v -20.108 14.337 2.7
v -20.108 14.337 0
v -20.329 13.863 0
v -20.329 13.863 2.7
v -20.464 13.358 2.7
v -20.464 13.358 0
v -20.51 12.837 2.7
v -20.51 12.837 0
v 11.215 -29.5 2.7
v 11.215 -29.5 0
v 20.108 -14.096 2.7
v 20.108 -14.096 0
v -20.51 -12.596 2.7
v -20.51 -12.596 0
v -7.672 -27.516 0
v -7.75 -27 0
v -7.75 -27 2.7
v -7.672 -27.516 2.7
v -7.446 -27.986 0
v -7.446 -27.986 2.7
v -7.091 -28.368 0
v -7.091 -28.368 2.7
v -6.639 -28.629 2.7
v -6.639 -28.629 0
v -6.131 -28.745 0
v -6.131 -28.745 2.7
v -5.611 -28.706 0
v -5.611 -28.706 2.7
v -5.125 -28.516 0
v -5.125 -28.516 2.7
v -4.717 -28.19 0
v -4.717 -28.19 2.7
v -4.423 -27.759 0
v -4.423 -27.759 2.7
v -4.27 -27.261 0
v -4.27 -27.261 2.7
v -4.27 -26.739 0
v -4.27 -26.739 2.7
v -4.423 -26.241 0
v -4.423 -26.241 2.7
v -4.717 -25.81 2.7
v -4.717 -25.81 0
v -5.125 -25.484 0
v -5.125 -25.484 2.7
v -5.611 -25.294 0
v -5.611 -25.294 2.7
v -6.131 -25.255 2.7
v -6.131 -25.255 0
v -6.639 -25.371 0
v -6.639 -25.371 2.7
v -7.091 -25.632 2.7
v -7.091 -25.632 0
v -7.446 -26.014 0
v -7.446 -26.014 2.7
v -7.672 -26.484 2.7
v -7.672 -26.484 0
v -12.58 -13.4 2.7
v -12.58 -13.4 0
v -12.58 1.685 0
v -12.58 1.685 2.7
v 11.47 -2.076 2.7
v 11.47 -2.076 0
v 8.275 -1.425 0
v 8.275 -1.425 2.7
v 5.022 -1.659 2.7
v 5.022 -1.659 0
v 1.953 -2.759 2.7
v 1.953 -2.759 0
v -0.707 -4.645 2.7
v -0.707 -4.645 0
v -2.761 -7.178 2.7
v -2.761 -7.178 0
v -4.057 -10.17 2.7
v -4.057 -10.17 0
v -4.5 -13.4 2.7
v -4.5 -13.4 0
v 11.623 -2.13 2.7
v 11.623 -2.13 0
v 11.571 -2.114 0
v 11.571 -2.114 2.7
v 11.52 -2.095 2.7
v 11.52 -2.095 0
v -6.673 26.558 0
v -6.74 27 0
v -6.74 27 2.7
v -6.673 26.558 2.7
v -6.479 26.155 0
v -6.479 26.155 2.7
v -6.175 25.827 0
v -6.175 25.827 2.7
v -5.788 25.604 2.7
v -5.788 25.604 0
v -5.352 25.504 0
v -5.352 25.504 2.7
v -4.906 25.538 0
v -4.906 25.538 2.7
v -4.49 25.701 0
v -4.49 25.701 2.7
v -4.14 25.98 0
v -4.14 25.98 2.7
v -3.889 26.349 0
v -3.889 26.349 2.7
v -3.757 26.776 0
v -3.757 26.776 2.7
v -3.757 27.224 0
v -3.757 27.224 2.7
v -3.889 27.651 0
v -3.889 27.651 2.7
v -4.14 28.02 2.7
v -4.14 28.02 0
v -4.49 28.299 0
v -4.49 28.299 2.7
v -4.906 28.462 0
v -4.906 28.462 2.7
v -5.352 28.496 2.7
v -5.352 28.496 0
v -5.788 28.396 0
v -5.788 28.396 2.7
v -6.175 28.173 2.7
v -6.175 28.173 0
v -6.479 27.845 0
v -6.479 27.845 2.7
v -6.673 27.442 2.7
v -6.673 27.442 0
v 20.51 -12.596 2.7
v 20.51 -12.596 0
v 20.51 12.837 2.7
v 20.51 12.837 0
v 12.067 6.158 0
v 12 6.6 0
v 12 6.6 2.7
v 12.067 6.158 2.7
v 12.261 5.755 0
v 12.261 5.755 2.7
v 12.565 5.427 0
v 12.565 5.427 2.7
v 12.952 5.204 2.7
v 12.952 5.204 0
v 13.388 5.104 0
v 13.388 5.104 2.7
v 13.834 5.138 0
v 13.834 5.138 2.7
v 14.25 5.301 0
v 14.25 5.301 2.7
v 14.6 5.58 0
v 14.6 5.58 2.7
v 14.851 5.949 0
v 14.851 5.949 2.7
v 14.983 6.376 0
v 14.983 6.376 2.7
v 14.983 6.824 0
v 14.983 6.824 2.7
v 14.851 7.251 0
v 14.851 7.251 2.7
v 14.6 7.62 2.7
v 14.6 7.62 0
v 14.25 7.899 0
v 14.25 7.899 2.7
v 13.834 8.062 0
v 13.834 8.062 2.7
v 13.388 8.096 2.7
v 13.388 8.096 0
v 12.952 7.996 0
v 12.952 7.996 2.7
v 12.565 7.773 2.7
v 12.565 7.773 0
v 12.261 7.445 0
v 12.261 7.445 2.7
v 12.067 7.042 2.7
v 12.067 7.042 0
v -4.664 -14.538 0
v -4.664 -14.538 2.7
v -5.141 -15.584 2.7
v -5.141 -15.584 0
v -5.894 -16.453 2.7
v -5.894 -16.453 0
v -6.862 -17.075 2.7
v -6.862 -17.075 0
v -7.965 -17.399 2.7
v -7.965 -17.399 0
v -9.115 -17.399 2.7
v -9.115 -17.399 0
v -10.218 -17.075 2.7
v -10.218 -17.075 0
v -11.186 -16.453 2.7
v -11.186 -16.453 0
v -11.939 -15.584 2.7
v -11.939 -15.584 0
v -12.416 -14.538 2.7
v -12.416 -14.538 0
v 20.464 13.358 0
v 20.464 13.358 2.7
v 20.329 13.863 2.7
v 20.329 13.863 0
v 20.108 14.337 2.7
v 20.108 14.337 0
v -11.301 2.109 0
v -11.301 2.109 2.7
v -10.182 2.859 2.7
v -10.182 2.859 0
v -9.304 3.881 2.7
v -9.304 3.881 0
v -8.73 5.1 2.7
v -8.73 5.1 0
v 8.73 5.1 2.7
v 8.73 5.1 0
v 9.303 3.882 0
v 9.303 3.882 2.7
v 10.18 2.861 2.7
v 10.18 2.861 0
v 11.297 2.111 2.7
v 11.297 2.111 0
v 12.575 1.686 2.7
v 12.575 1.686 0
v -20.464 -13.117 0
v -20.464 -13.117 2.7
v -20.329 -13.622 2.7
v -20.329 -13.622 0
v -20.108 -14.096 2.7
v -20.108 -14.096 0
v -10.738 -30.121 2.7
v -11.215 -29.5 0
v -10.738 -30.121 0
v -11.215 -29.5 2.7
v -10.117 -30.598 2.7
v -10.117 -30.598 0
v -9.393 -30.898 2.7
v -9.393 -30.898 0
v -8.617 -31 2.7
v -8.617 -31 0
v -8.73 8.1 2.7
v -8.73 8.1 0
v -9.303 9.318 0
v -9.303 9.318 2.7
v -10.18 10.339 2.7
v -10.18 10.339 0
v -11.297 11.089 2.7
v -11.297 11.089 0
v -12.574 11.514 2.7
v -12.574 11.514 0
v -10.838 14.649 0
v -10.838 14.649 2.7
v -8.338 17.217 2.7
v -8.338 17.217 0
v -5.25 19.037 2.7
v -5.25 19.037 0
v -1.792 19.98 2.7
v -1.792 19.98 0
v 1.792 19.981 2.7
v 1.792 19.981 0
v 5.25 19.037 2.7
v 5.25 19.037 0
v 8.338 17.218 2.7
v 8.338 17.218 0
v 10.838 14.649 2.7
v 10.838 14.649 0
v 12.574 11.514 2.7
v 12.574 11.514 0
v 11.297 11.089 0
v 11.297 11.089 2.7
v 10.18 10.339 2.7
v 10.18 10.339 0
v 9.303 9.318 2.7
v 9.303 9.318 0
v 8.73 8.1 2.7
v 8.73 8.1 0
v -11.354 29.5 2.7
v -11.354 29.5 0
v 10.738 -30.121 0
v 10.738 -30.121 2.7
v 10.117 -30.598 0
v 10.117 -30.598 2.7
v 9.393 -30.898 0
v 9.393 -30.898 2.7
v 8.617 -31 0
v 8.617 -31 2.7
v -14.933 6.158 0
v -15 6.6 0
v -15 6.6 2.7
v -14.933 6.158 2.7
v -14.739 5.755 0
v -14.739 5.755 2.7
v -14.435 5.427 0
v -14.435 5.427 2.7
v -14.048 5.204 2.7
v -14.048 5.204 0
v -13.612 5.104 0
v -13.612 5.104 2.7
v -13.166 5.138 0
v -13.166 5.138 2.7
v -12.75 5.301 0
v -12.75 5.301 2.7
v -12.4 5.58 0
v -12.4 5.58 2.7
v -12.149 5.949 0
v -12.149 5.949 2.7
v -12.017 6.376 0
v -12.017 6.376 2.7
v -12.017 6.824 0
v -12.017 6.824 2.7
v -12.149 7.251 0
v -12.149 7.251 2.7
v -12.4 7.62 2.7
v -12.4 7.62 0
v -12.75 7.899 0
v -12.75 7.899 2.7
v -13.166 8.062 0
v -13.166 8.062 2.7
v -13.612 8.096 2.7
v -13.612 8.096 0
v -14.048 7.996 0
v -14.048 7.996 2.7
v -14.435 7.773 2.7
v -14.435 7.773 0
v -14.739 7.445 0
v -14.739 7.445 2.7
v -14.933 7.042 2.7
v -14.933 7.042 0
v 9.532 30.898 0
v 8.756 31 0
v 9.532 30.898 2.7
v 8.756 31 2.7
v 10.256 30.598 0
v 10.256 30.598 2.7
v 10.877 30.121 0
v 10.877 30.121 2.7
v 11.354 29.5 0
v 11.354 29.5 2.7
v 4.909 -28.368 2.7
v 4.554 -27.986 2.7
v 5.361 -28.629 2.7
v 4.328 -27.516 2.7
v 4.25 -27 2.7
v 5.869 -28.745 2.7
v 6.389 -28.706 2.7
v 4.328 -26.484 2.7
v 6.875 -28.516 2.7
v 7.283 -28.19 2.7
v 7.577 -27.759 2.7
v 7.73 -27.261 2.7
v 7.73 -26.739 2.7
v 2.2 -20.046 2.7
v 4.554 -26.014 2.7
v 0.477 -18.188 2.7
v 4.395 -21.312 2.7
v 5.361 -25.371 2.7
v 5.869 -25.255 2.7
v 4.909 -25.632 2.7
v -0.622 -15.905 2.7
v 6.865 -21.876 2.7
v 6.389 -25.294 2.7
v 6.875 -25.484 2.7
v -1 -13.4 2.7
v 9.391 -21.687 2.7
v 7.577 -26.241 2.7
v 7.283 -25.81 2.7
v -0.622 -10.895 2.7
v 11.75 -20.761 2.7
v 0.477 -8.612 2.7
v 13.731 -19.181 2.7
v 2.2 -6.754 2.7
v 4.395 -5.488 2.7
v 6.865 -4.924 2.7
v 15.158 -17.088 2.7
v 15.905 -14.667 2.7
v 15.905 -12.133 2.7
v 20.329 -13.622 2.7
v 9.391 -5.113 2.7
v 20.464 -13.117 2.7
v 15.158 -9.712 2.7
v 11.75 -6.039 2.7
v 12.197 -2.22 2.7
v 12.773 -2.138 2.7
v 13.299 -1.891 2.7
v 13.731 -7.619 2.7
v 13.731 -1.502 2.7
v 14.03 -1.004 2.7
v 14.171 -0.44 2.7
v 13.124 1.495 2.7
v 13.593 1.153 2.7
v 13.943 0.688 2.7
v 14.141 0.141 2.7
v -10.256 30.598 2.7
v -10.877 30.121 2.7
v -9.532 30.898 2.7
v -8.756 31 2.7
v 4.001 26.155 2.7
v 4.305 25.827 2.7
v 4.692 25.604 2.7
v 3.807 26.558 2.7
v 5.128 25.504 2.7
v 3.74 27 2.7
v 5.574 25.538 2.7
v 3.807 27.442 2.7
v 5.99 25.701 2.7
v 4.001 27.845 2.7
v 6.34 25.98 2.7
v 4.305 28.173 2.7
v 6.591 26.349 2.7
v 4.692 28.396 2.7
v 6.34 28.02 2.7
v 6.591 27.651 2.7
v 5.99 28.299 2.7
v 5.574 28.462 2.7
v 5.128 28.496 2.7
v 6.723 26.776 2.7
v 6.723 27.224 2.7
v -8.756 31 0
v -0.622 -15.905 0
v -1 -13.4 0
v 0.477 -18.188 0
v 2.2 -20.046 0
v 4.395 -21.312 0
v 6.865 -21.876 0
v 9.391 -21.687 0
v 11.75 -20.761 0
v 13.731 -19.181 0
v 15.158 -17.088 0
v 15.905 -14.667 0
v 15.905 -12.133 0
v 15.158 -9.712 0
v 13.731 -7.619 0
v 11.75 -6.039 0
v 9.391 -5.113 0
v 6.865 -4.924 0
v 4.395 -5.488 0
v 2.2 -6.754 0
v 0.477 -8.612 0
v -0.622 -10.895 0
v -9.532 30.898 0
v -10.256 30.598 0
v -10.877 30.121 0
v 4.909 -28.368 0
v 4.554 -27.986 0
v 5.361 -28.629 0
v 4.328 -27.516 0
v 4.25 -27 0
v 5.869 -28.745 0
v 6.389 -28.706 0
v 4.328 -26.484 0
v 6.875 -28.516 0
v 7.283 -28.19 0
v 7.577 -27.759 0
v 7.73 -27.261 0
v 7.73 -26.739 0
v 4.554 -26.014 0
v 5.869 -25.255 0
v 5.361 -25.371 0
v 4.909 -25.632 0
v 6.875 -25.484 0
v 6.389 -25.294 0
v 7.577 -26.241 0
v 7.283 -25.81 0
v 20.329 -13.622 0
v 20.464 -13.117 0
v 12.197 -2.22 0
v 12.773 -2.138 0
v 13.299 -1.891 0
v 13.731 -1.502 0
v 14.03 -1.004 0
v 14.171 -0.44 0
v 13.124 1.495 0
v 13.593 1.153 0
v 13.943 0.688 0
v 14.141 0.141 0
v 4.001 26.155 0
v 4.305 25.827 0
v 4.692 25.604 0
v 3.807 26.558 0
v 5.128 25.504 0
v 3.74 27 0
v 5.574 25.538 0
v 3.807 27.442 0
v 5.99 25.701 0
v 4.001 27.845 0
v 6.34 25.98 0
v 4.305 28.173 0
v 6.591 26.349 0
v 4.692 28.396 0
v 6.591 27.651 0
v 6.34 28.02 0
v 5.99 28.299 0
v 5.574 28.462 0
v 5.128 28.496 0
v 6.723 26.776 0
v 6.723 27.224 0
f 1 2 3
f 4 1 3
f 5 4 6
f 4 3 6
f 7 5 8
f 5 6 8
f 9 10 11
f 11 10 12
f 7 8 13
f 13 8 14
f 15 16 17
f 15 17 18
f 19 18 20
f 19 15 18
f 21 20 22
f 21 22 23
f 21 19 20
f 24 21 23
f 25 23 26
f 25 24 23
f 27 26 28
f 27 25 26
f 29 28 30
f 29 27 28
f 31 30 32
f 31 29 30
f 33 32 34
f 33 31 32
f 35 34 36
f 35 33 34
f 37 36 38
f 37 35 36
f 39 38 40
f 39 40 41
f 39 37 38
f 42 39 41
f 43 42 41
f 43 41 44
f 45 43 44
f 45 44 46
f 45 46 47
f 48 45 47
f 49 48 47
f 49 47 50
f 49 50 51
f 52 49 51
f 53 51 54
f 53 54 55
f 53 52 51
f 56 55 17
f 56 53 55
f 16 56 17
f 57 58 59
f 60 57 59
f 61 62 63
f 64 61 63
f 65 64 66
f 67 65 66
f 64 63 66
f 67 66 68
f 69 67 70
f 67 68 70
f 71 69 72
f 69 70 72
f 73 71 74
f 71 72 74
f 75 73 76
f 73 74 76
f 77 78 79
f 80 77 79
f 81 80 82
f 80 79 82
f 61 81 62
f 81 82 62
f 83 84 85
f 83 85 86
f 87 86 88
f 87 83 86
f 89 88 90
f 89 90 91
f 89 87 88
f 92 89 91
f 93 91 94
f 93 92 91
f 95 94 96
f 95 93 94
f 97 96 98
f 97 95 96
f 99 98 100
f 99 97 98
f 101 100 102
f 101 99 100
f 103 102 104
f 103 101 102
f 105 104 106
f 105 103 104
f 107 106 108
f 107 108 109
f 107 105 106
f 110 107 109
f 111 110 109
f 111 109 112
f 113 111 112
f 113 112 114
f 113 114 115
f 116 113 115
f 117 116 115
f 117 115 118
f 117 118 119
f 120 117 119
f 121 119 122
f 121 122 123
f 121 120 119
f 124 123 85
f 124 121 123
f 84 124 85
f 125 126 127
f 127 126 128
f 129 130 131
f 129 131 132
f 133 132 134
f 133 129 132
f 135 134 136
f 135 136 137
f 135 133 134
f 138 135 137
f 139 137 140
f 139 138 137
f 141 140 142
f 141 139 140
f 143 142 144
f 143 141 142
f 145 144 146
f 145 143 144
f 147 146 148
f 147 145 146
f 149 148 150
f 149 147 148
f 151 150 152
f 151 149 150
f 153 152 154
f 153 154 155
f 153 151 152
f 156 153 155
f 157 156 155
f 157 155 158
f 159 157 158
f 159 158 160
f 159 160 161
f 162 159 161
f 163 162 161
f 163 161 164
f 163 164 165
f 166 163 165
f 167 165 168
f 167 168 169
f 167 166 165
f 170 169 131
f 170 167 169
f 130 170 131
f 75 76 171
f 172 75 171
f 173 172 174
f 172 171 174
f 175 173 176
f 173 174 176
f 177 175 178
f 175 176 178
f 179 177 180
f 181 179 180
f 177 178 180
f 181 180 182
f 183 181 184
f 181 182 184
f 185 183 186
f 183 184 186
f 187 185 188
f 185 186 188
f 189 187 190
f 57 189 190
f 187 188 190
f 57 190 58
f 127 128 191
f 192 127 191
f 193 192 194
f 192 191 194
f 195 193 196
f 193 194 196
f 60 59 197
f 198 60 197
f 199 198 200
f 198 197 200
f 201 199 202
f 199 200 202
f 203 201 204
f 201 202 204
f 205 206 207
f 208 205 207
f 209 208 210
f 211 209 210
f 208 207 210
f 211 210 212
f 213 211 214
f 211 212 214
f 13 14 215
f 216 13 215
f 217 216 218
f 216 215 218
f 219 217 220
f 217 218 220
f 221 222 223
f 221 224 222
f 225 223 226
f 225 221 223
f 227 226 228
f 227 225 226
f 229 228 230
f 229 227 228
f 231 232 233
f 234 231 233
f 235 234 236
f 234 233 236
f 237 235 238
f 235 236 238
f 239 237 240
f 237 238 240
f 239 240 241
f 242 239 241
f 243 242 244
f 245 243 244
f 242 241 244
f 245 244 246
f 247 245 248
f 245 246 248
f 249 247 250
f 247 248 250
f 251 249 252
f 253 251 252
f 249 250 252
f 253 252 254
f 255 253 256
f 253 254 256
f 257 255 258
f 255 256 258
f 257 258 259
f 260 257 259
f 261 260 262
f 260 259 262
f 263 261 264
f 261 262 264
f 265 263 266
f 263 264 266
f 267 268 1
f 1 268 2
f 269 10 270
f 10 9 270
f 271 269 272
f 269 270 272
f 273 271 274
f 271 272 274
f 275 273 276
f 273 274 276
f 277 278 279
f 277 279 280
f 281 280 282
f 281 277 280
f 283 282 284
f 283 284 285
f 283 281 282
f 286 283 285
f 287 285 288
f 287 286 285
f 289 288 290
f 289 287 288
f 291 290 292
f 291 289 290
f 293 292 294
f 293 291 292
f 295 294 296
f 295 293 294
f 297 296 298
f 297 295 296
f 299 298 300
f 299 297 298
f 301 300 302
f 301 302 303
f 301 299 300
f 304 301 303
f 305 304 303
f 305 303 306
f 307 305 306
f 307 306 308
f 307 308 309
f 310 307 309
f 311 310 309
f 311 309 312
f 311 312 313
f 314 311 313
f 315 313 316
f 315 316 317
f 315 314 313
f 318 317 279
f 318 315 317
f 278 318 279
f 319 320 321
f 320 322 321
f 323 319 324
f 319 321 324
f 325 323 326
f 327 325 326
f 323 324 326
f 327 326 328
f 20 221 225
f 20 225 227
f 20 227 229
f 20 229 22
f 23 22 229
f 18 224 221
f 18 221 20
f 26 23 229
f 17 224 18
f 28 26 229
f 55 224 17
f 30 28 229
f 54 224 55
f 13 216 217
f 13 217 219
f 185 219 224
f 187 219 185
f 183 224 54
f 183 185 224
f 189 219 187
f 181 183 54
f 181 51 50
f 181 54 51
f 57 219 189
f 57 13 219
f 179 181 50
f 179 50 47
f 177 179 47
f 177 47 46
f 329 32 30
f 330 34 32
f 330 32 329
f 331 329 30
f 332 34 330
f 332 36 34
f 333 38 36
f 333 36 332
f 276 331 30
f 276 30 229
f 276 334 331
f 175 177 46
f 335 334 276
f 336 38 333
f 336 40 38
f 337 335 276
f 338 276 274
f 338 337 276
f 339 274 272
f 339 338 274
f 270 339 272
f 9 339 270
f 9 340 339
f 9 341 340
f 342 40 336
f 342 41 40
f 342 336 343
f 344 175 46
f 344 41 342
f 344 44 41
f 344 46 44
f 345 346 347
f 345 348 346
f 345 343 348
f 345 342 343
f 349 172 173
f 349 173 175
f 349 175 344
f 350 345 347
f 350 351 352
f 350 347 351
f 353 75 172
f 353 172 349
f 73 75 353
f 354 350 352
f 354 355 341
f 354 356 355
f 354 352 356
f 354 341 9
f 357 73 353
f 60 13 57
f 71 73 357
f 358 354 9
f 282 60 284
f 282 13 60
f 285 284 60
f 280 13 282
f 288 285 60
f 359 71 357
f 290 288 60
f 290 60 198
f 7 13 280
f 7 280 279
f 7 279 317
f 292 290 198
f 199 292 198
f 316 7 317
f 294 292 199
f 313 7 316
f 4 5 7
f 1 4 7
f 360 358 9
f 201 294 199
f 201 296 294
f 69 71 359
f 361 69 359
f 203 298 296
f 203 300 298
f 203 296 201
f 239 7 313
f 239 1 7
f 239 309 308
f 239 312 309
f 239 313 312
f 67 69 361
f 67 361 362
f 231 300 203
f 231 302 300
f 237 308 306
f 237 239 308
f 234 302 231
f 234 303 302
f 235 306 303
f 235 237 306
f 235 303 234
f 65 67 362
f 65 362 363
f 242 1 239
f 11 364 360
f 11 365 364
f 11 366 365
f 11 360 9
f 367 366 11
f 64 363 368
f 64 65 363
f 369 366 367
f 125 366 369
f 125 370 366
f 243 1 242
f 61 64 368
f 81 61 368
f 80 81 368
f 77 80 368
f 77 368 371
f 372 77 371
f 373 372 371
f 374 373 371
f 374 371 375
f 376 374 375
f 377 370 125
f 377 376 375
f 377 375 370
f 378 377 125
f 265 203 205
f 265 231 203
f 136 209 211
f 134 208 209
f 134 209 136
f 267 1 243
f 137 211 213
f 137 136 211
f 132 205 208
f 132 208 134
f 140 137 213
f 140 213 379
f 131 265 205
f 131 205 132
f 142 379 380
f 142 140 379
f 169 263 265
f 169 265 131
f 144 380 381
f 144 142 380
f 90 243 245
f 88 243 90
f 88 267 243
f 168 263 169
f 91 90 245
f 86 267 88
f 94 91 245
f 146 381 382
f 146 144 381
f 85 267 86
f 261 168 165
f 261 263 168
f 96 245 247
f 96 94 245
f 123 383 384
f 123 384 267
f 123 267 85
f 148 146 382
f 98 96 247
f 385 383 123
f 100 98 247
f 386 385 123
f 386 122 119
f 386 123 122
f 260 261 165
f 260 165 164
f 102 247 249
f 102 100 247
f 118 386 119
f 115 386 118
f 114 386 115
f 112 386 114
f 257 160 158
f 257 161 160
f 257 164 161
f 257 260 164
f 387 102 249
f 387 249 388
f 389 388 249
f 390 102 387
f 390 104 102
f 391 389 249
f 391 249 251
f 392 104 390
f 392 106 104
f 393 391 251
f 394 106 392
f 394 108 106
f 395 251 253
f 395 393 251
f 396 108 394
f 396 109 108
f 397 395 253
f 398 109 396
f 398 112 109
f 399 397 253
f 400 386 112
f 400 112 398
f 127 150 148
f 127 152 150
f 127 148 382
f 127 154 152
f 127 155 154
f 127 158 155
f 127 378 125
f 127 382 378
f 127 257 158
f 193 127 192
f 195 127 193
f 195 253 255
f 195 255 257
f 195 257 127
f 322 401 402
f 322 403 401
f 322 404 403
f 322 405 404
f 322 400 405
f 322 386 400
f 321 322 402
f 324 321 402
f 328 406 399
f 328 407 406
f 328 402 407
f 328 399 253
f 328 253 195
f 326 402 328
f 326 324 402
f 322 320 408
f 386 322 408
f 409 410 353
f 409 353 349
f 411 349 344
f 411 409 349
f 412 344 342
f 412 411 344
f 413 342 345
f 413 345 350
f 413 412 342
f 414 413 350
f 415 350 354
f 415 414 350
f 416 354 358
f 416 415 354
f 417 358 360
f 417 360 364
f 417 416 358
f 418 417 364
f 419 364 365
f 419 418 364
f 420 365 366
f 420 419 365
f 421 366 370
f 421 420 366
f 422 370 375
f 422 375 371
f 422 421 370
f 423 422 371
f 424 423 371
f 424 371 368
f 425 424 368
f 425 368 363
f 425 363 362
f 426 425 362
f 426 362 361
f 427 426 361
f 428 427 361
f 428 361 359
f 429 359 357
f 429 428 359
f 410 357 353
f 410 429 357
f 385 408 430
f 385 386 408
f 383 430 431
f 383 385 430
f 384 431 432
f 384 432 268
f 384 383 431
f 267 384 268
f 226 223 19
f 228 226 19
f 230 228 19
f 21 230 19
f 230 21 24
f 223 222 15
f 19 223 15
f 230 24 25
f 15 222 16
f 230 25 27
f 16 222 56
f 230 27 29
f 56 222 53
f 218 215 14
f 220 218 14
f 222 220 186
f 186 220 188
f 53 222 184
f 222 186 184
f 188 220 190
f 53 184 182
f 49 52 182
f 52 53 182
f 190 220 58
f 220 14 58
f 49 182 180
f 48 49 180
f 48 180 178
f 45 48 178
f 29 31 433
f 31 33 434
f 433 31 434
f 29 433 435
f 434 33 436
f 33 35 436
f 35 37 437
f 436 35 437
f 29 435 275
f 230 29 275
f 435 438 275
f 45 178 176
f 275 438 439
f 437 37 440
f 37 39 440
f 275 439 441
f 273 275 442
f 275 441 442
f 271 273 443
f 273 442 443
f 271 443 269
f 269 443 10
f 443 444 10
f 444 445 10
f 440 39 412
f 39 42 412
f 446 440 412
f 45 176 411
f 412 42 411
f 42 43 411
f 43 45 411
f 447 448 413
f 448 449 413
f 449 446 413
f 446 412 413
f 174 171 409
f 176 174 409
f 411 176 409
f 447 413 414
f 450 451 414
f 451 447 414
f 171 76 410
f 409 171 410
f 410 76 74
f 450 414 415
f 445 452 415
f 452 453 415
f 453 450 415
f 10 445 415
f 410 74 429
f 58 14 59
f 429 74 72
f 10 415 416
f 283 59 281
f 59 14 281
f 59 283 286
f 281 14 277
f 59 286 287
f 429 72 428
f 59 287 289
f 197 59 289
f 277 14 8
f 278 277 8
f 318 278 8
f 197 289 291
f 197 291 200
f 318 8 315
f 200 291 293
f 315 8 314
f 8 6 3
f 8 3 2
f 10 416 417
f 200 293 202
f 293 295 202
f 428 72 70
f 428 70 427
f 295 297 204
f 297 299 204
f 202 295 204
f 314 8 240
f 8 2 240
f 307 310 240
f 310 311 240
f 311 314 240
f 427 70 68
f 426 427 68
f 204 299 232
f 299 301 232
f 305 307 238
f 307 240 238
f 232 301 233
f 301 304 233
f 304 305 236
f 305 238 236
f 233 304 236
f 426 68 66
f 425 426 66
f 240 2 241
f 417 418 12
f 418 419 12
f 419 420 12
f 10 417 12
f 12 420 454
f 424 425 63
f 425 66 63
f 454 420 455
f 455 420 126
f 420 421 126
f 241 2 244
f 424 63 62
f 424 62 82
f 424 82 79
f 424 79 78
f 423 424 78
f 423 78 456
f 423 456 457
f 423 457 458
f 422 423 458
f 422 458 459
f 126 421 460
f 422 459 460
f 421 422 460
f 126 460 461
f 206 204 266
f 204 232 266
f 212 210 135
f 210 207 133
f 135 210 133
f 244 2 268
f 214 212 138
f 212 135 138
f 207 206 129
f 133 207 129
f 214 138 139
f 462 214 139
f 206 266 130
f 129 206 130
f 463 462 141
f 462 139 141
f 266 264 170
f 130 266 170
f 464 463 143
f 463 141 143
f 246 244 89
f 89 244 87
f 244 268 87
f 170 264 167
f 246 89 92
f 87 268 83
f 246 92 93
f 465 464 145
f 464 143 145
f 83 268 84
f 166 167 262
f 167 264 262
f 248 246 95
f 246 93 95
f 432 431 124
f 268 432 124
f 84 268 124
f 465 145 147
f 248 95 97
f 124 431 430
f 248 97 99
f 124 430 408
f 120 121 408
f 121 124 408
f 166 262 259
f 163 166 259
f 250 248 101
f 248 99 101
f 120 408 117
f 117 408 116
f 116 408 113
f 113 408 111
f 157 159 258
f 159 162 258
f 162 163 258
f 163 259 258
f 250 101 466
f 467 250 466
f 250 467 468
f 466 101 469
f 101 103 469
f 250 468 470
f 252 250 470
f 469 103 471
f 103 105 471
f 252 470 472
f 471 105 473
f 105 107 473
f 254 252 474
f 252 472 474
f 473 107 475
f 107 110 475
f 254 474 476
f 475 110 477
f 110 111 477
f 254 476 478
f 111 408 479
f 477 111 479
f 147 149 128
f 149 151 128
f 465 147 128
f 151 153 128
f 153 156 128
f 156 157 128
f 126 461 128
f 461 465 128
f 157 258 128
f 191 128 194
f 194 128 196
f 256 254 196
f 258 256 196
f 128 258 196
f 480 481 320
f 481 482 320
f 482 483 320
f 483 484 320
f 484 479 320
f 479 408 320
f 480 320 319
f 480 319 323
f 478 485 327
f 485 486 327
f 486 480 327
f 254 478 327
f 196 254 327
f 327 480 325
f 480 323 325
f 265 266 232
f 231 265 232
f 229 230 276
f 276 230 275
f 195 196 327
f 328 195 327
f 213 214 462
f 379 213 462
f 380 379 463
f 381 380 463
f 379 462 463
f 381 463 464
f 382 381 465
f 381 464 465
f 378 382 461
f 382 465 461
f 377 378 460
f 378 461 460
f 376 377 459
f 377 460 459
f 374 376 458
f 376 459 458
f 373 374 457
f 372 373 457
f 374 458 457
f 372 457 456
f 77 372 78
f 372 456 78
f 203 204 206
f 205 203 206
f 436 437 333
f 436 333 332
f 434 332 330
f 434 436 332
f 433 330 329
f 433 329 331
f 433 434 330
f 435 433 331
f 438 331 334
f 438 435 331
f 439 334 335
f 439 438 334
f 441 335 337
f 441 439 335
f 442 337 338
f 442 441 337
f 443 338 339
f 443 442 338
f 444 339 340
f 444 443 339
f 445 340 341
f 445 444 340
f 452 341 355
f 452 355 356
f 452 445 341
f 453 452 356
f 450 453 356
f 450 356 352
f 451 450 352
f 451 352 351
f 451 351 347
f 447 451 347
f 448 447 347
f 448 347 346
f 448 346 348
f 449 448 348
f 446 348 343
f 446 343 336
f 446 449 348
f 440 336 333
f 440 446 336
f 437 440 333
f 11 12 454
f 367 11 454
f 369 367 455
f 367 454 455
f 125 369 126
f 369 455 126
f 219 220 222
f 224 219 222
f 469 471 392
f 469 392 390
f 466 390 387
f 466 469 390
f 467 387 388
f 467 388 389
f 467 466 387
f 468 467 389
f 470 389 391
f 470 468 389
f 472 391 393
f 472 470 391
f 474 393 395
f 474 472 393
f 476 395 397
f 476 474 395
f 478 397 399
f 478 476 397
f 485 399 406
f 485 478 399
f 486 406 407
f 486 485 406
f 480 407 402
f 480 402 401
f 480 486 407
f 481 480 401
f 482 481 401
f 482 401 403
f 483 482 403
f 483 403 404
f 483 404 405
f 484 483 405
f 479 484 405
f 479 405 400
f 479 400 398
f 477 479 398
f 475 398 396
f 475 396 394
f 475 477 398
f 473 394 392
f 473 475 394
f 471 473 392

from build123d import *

# Parameters (mm, degrees)
SKETCH1_R           = 1.75
SKETCH1_R_2         = 8.5
SKETCH1_R_3         = 1.5
BOSS_EXTRUDE1_DEPTH = 2.7
FILLET1_R           = 3


with BuildPart() as part:
    # Sketch1 → Boss-Extrude1 (new body)
    with BuildSketch(Plane.XY):
        with BuildLine():
            Line((10.487675588, 31), (-10.487675588, 31))
            Line((-10.487675588, 31), (-20.108076211, 14.336977332))
            ThreePointArc((-20.108076211, 14.336977332), (-20.407777479, 13.613434467), (-20.51, 12.836977332))
            Line((-20.51, 12.836977332), (-20.51, -12.596152423))
            ThreePointArc((-20.51, -12.596152423), (-20.407777479, -13.372609558), (-20.108076211, -14.096152423))
            Line((-20.108076211, -14.096152423), (-10.348635262, -31))
            Line((-10.348635262, -31), (10.348635262, -31))
            Line((10.348635262, -31), (20.108076211, -14.096152423))
            ThreePointArc((20.108076211, -14.096152423), (20.407777479, -13.372609558), (20.51, -12.596152423))
            Line((20.51, -12.596152423), (20.51, 12.836977332))
            ThreePointArc((20.51, 12.836977332), (20.407777479, 13.613434467), (20.108076211, 14.336977332))
            Line((20.108076211, 14.336977332), (10.487675588, 31))
        make_face()
        with Locations(Location((-6, -27, 0), (0, 0, 180))):
            Circle(SKETCH1_R, mode=Mode.SUBTRACT)
        with Locations(Location((6, -27, 0), (0, 0, 180))):
            Circle(SKETCH1_R, mode=Mode.SUBTRACT)
        with Locations(Location((7.5, -13.4, 0), (0, 0, 180))):
            Circle(SKETCH1_R_2, mode=Mode.SUBTRACT)
        with BuildLine():
            ThreePointArc((-4.5, -13.4), (-8.54, -17.44), (-12.58, -13.4))
            Line((-12.58, -13.4), (-12.58, 1.685368783))
            ThreePointArc((-12.58, 1.685368783), (-10.18215631, 2.859423407), (-8.730303993, 5.1))
            Line((-8.730303993, 5.1), (8.729875369, 5.1))
            ThreePointArc((8.729875369, 5.1), (10.179804764, 2.860963681), (12.574584064, 1.685969643))
            ThreePointArc((12.574584064, 1.685969643), (14.121431526, -0.726790857), (11.622623122, -2.13039581))
            ThreePointArc((11.622623122, -2.13039581), (11.545720037, -2.104624526), (11.469942926, -2.075709596))
            ThreePointArc((11.469942926, -2.075709596), (0.558793877, -3.611248417), (-4.5, -13.4))
        make_face(mode=Mode.SUBTRACT)
        with Locations(Location((-13.5, 6.6, 0), (0, 0, 180))):
            Circle(SKETCH1_R_3, mode=Mode.SUBTRACT)
        with BuildLine():
            Line((8.729875369, 8.1), (-8.730303993, 8.1))
            ThreePointArc((-8.730303993, 8.1), (-10.179901517, 10.338575405), (-12.574074074, 11.513518208))
            ThreePointArc((-12.574074074, 11.513518208), (-0.00020804, 20.099999998), (12.57392263, 11.513905748))
            ThreePointArc((12.57392263, 11.513905748), (10.179553129, 10.338812856), (8.729875369, 8.1))
        make_face(mode=Mode.SUBTRACT)
        with Locations(Location((-5.24, 27, 0), (0, 0, 180))):
            Circle(SKETCH1_R_3, mode=Mode.SUBTRACT)
        with Locations(Location((13.5, 6.6, 0), (0, 0, 180))):
            Circle(SKETCH1_R_3, mode=Mode.SUBTRACT)
        with Locations(Location((5.24, 27, 0), (0, 0, 180))):
            Circle(SKETCH1_R_3, mode=Mode.SUBTRACT)
    extrude(amount=BOSS_EXTRUDE1_DEPTH)

    # Fillet1
    fillet1_edges = [part.edges().sort_by_distance(p)[0] for p in [
        (-10.487675588, 31, 1.35),
        (10.487675588, 31, 1.35),
        (10.348635262, -31, 1.35),
        (-10.348635262, -31, 1.35),
    ]]
    fillet(fillet1_edges, radius=FILLET1_R)


solid = part.part
